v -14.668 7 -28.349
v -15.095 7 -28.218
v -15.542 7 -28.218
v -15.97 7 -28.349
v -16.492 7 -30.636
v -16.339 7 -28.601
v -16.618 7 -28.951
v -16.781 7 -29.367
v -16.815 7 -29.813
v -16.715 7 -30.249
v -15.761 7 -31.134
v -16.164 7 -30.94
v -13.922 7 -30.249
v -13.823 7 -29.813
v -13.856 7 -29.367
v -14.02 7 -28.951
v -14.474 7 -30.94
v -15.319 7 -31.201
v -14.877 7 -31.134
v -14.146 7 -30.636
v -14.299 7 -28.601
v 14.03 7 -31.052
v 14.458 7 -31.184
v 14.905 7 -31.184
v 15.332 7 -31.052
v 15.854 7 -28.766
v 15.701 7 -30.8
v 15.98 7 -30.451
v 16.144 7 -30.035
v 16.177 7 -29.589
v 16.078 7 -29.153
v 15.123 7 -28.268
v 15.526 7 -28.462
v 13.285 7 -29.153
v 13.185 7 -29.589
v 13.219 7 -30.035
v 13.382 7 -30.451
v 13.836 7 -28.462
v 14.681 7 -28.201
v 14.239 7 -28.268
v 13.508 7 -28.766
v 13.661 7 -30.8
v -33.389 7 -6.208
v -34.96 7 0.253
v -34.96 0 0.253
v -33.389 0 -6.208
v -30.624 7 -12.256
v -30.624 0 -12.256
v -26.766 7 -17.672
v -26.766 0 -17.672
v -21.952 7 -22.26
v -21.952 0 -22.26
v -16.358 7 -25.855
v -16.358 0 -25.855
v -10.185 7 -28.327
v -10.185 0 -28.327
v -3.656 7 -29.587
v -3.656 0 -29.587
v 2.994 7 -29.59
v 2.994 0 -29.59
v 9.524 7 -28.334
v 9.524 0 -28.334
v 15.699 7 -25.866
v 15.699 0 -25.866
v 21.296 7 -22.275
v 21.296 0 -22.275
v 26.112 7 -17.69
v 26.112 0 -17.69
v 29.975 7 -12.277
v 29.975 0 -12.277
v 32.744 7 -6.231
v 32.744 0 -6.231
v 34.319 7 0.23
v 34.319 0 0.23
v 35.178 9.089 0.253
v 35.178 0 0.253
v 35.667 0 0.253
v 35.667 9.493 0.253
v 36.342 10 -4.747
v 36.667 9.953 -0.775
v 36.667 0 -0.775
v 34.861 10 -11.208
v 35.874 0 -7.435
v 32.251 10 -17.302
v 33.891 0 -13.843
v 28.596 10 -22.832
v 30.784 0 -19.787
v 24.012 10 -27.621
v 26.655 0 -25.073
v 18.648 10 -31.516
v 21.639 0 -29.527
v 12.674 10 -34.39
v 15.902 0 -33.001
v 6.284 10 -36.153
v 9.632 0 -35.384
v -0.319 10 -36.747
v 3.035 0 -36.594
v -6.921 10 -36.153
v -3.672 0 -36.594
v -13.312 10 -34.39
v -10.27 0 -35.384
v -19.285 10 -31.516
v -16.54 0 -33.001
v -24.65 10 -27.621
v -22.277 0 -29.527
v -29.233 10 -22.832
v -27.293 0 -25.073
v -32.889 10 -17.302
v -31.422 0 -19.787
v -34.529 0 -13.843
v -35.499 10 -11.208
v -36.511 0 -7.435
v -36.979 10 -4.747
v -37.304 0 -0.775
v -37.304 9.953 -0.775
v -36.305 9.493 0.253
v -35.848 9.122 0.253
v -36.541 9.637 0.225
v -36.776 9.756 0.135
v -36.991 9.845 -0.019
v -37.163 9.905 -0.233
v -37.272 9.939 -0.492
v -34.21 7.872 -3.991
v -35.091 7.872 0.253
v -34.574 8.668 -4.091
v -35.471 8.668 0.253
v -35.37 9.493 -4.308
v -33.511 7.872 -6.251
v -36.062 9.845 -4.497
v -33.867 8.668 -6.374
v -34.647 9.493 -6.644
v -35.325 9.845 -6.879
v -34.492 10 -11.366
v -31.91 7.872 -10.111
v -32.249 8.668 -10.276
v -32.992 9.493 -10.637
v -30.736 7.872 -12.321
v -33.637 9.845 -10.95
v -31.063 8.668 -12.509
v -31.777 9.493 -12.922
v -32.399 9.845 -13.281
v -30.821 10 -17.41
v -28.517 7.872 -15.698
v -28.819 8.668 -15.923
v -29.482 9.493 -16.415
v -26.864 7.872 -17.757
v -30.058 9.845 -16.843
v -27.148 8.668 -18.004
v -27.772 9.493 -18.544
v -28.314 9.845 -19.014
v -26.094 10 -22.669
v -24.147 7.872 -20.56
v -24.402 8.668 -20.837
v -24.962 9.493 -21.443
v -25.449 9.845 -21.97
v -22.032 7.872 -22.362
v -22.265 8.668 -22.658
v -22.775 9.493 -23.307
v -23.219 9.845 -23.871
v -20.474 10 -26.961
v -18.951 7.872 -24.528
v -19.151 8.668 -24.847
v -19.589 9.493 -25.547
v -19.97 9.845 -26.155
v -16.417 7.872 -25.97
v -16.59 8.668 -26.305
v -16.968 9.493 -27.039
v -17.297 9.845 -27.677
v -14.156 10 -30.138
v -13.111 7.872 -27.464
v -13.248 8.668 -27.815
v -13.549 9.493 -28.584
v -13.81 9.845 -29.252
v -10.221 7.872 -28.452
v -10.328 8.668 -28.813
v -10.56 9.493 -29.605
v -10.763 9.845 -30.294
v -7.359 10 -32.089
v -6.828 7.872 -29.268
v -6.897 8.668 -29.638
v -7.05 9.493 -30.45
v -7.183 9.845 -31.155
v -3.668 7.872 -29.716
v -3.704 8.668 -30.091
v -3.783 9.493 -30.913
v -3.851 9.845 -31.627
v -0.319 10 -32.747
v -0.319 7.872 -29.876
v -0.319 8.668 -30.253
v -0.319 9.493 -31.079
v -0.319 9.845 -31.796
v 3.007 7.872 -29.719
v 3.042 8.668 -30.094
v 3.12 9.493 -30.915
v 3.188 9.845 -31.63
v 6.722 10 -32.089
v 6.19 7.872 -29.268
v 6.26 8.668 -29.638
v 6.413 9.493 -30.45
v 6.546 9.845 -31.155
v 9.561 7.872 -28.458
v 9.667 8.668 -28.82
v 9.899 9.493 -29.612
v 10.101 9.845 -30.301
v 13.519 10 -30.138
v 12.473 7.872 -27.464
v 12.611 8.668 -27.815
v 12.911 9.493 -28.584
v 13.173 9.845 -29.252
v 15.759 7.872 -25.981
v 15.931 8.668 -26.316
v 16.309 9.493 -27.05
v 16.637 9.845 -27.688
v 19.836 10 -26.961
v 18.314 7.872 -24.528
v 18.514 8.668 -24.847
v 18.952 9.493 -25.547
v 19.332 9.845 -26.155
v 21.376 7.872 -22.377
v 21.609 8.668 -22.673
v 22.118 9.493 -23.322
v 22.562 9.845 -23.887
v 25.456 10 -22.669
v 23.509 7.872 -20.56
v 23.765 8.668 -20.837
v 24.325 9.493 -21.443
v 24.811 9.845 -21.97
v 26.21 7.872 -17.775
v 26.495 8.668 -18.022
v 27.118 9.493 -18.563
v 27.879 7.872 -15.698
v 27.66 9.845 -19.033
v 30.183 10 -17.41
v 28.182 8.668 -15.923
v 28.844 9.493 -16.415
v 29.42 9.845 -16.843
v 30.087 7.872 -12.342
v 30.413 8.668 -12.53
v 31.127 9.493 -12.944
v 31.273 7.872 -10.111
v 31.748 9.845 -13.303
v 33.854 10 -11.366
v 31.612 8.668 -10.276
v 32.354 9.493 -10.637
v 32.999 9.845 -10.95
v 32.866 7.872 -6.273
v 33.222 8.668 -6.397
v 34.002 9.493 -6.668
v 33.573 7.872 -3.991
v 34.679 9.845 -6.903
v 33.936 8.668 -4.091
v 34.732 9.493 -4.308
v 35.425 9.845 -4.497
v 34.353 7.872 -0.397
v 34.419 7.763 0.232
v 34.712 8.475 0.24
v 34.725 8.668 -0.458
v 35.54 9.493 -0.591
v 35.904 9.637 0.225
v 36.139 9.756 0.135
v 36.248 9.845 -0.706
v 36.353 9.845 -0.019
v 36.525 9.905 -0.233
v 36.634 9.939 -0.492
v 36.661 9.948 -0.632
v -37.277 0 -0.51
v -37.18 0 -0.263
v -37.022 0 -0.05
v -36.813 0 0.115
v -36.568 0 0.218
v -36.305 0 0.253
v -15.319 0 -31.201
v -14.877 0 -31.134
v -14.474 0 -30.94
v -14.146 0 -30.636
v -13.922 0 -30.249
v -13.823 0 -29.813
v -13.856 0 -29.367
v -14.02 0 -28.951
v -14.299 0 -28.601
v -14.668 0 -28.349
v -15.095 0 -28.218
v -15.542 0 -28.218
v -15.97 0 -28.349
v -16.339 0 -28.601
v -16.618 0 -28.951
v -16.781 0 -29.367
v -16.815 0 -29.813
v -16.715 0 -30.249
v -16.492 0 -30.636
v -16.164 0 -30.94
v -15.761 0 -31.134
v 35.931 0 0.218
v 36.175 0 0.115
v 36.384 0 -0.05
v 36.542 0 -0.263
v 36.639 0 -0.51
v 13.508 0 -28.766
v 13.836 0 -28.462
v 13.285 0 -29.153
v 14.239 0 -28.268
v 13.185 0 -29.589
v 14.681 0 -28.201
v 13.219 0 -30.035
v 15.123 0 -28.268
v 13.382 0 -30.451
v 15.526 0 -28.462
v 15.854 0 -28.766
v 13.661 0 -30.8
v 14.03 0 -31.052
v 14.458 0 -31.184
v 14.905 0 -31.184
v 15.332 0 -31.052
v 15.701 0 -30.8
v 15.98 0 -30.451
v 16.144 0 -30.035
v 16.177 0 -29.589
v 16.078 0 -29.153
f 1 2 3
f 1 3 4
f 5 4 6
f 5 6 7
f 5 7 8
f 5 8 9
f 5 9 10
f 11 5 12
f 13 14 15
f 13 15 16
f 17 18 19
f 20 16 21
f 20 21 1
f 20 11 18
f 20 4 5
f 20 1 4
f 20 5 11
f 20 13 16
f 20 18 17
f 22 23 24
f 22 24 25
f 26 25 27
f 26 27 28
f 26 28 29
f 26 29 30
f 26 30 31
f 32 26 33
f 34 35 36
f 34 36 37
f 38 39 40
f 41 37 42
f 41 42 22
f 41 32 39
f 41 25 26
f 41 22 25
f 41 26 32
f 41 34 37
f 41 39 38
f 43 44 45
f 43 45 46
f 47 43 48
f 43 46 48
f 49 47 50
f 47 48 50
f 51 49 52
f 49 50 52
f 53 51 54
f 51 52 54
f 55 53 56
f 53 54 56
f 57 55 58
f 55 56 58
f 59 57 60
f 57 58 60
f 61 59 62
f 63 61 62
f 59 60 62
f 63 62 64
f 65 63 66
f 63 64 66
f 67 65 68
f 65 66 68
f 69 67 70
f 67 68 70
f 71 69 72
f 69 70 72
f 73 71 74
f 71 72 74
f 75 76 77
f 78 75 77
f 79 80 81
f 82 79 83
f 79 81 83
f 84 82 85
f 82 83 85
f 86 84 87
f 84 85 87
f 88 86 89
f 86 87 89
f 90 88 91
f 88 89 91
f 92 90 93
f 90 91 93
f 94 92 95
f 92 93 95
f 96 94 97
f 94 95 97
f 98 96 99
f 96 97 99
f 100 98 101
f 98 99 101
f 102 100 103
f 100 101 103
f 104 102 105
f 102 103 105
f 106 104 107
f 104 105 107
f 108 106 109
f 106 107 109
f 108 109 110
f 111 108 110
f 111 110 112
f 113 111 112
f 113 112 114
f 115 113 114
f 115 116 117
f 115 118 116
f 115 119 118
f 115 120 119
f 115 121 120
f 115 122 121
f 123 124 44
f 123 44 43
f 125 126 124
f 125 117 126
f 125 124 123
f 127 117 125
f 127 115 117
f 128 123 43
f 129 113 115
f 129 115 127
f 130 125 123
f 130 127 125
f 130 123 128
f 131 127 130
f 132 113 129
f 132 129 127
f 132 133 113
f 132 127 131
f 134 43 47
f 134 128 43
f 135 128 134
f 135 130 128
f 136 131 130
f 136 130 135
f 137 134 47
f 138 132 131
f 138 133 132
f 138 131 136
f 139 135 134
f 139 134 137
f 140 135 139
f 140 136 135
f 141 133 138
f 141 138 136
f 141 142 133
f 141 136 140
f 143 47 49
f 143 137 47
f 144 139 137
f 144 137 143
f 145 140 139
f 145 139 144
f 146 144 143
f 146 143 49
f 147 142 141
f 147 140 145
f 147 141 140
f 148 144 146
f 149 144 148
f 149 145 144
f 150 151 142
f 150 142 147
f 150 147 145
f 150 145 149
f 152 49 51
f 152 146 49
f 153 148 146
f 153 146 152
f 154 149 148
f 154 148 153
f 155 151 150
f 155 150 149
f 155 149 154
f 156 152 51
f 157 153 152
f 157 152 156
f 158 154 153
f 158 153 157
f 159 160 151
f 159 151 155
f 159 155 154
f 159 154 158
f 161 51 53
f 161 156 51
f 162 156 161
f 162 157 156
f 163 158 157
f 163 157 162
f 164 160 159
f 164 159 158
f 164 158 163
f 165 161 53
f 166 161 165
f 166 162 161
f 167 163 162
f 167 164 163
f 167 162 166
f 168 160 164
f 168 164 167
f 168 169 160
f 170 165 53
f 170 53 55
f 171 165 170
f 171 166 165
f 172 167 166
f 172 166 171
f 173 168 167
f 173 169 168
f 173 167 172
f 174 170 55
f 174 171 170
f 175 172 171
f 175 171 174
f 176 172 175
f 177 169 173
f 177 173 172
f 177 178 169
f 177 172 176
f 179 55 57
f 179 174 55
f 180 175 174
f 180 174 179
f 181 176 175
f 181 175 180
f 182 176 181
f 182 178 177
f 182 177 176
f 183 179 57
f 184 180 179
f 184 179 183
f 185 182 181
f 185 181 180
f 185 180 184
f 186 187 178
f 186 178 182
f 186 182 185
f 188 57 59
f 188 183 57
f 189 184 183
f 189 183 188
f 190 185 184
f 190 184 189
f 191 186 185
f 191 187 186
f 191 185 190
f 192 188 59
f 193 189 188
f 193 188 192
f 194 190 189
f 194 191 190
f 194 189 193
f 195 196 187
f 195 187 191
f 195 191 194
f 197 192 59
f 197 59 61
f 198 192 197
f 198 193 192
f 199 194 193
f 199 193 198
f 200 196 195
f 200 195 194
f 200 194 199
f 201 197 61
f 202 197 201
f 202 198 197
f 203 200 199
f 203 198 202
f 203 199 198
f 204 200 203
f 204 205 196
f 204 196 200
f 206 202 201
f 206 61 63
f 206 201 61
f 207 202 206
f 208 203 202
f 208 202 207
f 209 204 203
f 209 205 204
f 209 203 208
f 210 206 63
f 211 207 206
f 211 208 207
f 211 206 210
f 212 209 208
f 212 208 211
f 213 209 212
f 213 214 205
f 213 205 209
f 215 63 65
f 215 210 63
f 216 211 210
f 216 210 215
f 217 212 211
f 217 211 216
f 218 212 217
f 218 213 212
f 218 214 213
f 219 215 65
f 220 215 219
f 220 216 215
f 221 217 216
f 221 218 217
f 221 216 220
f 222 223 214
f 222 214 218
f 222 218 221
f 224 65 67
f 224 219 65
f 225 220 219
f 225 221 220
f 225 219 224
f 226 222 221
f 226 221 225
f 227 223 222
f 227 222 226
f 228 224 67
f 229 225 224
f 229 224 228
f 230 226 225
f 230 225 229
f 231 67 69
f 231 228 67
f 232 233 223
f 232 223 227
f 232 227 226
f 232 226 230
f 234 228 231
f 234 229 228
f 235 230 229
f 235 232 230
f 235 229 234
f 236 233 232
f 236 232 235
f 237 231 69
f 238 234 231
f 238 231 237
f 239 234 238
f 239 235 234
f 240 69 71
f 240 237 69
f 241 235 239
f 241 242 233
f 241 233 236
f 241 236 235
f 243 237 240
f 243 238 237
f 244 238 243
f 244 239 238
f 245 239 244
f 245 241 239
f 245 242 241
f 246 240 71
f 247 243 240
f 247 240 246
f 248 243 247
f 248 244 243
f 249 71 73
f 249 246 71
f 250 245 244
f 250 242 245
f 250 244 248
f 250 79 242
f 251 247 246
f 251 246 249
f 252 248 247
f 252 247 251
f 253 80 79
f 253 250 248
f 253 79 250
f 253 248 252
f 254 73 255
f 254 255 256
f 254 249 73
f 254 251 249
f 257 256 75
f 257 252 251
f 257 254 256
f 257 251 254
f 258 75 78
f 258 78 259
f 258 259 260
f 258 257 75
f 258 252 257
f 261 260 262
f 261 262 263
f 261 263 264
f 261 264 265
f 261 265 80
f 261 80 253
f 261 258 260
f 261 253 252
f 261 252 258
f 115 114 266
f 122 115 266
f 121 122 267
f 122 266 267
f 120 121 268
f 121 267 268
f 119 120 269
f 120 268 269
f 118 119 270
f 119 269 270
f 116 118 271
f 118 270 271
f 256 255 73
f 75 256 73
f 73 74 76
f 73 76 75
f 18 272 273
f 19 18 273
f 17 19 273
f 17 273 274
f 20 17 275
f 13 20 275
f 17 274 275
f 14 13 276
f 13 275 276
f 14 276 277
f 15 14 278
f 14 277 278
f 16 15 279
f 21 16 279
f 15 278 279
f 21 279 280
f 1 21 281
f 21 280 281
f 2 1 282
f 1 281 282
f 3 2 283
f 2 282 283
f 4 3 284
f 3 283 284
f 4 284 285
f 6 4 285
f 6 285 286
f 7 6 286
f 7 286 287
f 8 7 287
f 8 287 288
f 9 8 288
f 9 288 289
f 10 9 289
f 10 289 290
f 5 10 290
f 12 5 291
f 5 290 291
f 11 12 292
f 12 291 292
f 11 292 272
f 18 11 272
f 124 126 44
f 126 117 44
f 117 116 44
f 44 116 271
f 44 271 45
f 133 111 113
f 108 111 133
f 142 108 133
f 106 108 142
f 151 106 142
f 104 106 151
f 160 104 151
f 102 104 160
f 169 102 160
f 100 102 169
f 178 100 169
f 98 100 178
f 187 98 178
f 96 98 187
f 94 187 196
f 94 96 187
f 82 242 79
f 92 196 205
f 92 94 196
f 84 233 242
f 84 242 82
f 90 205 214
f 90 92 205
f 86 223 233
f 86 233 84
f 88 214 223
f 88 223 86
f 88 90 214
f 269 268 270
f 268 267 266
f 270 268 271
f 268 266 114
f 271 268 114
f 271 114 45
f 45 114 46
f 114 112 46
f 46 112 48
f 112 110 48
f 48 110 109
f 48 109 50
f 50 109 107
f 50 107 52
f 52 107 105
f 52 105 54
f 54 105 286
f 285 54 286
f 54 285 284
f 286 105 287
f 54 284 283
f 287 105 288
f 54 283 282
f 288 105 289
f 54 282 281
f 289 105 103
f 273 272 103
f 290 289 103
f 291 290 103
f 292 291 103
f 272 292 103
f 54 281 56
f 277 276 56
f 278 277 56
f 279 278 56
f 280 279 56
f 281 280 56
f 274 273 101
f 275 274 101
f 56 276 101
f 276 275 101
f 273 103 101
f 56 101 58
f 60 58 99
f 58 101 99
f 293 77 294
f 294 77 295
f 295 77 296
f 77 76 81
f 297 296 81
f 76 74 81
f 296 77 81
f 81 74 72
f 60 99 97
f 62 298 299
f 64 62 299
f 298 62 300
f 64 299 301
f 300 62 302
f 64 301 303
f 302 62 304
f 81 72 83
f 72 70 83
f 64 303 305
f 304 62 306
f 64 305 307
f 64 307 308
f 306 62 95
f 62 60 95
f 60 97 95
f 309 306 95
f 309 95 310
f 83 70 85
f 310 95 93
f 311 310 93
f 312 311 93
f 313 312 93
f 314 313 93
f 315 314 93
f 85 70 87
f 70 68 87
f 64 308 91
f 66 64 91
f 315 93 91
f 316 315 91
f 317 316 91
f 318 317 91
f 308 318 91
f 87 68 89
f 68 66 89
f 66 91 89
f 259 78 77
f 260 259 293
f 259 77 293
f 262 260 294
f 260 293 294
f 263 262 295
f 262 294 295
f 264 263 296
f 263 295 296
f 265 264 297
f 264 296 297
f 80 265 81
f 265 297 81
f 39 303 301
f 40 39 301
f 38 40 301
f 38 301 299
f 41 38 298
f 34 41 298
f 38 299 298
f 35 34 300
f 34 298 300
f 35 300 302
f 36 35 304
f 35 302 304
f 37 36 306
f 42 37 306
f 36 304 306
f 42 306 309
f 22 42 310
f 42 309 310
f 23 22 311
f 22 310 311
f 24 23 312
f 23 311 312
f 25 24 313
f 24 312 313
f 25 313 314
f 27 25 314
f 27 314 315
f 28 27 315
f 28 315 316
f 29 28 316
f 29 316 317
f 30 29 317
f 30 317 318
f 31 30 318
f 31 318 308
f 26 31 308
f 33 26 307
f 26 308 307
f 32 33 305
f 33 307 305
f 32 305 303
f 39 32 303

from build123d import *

# Parameters (mm, degrees)
EXTRUDE_1_DEPTH     = 10
FILLET_2_R          = 3
SKETCH_2_R          = 1.5
CUT_EXTRUDE_1_DEPTH = 7


with BuildPart() as part:
    # 草图1 → 凸台-拉伸1 (new body)
    with BuildSketch(Plane(origin=(0, 0, 0), x_dir=(1, 0, 0), z_dir=(0, 1, 0))):
        with BuildLine():
            Line((35.177708011, -0.253238784), (35.667337743, -0.253238784))
            ThreePointArc((35.667337743, -0.253238784), (36.384198182, 0.049544528), (36.666951866, 0.774538994))
            ThreePointArc((36.666951866, 0.774538994), (-0.318770688, 36.746761216), (-37.304493242, 0.774538994))
            ThreePointArc((-37.304493242, 0.774538994), (-37.021739558, 0.049544528), (-36.304879119, -0.253238784))
            Line((-36.304879119, -0.253238784), (-35.815249387, -0.253238784))
            Line((-35.815249387, -0.253238784), (-34.959786839, -0.253238784))
            ThreePointArc((-34.959786839, -0.253238784), (-0.330707465, 29.746759181), (34.318826897, -0.229611257))
            Line((34.318826897, -0.229611257), (35.177708011, -0.253238784))
        make_face()
    extrude(amount=EXTRUDE_1_DEPTH)

    # 圆角2
    fillet_2_edges = [part.edges().sort_by_distance(p)[0] for p in [
        (-0.330707465, 10, -29.746759181),
    ]]
    fillet(fillet_2_edges, radius=FILLET_2_R)

    # 草图2 → 切除-拉伸1 (cut)
    with BuildSketch(Plane.XZ):
        with Locations(Location((-15.318770688, -29.700892818, 0), (0, 0, 270))):
            Circle(SKETCH_2_R)
        with Locations(Location((14.681229312, -29.700892818, 0), (0, 0, 90))):
            Circle(SKETCH_2_R)
    extrude(amount=-CUT_EXTRUDE_1_DEPTH, mode=Mode.SUBTRACT)


solid = part.part
